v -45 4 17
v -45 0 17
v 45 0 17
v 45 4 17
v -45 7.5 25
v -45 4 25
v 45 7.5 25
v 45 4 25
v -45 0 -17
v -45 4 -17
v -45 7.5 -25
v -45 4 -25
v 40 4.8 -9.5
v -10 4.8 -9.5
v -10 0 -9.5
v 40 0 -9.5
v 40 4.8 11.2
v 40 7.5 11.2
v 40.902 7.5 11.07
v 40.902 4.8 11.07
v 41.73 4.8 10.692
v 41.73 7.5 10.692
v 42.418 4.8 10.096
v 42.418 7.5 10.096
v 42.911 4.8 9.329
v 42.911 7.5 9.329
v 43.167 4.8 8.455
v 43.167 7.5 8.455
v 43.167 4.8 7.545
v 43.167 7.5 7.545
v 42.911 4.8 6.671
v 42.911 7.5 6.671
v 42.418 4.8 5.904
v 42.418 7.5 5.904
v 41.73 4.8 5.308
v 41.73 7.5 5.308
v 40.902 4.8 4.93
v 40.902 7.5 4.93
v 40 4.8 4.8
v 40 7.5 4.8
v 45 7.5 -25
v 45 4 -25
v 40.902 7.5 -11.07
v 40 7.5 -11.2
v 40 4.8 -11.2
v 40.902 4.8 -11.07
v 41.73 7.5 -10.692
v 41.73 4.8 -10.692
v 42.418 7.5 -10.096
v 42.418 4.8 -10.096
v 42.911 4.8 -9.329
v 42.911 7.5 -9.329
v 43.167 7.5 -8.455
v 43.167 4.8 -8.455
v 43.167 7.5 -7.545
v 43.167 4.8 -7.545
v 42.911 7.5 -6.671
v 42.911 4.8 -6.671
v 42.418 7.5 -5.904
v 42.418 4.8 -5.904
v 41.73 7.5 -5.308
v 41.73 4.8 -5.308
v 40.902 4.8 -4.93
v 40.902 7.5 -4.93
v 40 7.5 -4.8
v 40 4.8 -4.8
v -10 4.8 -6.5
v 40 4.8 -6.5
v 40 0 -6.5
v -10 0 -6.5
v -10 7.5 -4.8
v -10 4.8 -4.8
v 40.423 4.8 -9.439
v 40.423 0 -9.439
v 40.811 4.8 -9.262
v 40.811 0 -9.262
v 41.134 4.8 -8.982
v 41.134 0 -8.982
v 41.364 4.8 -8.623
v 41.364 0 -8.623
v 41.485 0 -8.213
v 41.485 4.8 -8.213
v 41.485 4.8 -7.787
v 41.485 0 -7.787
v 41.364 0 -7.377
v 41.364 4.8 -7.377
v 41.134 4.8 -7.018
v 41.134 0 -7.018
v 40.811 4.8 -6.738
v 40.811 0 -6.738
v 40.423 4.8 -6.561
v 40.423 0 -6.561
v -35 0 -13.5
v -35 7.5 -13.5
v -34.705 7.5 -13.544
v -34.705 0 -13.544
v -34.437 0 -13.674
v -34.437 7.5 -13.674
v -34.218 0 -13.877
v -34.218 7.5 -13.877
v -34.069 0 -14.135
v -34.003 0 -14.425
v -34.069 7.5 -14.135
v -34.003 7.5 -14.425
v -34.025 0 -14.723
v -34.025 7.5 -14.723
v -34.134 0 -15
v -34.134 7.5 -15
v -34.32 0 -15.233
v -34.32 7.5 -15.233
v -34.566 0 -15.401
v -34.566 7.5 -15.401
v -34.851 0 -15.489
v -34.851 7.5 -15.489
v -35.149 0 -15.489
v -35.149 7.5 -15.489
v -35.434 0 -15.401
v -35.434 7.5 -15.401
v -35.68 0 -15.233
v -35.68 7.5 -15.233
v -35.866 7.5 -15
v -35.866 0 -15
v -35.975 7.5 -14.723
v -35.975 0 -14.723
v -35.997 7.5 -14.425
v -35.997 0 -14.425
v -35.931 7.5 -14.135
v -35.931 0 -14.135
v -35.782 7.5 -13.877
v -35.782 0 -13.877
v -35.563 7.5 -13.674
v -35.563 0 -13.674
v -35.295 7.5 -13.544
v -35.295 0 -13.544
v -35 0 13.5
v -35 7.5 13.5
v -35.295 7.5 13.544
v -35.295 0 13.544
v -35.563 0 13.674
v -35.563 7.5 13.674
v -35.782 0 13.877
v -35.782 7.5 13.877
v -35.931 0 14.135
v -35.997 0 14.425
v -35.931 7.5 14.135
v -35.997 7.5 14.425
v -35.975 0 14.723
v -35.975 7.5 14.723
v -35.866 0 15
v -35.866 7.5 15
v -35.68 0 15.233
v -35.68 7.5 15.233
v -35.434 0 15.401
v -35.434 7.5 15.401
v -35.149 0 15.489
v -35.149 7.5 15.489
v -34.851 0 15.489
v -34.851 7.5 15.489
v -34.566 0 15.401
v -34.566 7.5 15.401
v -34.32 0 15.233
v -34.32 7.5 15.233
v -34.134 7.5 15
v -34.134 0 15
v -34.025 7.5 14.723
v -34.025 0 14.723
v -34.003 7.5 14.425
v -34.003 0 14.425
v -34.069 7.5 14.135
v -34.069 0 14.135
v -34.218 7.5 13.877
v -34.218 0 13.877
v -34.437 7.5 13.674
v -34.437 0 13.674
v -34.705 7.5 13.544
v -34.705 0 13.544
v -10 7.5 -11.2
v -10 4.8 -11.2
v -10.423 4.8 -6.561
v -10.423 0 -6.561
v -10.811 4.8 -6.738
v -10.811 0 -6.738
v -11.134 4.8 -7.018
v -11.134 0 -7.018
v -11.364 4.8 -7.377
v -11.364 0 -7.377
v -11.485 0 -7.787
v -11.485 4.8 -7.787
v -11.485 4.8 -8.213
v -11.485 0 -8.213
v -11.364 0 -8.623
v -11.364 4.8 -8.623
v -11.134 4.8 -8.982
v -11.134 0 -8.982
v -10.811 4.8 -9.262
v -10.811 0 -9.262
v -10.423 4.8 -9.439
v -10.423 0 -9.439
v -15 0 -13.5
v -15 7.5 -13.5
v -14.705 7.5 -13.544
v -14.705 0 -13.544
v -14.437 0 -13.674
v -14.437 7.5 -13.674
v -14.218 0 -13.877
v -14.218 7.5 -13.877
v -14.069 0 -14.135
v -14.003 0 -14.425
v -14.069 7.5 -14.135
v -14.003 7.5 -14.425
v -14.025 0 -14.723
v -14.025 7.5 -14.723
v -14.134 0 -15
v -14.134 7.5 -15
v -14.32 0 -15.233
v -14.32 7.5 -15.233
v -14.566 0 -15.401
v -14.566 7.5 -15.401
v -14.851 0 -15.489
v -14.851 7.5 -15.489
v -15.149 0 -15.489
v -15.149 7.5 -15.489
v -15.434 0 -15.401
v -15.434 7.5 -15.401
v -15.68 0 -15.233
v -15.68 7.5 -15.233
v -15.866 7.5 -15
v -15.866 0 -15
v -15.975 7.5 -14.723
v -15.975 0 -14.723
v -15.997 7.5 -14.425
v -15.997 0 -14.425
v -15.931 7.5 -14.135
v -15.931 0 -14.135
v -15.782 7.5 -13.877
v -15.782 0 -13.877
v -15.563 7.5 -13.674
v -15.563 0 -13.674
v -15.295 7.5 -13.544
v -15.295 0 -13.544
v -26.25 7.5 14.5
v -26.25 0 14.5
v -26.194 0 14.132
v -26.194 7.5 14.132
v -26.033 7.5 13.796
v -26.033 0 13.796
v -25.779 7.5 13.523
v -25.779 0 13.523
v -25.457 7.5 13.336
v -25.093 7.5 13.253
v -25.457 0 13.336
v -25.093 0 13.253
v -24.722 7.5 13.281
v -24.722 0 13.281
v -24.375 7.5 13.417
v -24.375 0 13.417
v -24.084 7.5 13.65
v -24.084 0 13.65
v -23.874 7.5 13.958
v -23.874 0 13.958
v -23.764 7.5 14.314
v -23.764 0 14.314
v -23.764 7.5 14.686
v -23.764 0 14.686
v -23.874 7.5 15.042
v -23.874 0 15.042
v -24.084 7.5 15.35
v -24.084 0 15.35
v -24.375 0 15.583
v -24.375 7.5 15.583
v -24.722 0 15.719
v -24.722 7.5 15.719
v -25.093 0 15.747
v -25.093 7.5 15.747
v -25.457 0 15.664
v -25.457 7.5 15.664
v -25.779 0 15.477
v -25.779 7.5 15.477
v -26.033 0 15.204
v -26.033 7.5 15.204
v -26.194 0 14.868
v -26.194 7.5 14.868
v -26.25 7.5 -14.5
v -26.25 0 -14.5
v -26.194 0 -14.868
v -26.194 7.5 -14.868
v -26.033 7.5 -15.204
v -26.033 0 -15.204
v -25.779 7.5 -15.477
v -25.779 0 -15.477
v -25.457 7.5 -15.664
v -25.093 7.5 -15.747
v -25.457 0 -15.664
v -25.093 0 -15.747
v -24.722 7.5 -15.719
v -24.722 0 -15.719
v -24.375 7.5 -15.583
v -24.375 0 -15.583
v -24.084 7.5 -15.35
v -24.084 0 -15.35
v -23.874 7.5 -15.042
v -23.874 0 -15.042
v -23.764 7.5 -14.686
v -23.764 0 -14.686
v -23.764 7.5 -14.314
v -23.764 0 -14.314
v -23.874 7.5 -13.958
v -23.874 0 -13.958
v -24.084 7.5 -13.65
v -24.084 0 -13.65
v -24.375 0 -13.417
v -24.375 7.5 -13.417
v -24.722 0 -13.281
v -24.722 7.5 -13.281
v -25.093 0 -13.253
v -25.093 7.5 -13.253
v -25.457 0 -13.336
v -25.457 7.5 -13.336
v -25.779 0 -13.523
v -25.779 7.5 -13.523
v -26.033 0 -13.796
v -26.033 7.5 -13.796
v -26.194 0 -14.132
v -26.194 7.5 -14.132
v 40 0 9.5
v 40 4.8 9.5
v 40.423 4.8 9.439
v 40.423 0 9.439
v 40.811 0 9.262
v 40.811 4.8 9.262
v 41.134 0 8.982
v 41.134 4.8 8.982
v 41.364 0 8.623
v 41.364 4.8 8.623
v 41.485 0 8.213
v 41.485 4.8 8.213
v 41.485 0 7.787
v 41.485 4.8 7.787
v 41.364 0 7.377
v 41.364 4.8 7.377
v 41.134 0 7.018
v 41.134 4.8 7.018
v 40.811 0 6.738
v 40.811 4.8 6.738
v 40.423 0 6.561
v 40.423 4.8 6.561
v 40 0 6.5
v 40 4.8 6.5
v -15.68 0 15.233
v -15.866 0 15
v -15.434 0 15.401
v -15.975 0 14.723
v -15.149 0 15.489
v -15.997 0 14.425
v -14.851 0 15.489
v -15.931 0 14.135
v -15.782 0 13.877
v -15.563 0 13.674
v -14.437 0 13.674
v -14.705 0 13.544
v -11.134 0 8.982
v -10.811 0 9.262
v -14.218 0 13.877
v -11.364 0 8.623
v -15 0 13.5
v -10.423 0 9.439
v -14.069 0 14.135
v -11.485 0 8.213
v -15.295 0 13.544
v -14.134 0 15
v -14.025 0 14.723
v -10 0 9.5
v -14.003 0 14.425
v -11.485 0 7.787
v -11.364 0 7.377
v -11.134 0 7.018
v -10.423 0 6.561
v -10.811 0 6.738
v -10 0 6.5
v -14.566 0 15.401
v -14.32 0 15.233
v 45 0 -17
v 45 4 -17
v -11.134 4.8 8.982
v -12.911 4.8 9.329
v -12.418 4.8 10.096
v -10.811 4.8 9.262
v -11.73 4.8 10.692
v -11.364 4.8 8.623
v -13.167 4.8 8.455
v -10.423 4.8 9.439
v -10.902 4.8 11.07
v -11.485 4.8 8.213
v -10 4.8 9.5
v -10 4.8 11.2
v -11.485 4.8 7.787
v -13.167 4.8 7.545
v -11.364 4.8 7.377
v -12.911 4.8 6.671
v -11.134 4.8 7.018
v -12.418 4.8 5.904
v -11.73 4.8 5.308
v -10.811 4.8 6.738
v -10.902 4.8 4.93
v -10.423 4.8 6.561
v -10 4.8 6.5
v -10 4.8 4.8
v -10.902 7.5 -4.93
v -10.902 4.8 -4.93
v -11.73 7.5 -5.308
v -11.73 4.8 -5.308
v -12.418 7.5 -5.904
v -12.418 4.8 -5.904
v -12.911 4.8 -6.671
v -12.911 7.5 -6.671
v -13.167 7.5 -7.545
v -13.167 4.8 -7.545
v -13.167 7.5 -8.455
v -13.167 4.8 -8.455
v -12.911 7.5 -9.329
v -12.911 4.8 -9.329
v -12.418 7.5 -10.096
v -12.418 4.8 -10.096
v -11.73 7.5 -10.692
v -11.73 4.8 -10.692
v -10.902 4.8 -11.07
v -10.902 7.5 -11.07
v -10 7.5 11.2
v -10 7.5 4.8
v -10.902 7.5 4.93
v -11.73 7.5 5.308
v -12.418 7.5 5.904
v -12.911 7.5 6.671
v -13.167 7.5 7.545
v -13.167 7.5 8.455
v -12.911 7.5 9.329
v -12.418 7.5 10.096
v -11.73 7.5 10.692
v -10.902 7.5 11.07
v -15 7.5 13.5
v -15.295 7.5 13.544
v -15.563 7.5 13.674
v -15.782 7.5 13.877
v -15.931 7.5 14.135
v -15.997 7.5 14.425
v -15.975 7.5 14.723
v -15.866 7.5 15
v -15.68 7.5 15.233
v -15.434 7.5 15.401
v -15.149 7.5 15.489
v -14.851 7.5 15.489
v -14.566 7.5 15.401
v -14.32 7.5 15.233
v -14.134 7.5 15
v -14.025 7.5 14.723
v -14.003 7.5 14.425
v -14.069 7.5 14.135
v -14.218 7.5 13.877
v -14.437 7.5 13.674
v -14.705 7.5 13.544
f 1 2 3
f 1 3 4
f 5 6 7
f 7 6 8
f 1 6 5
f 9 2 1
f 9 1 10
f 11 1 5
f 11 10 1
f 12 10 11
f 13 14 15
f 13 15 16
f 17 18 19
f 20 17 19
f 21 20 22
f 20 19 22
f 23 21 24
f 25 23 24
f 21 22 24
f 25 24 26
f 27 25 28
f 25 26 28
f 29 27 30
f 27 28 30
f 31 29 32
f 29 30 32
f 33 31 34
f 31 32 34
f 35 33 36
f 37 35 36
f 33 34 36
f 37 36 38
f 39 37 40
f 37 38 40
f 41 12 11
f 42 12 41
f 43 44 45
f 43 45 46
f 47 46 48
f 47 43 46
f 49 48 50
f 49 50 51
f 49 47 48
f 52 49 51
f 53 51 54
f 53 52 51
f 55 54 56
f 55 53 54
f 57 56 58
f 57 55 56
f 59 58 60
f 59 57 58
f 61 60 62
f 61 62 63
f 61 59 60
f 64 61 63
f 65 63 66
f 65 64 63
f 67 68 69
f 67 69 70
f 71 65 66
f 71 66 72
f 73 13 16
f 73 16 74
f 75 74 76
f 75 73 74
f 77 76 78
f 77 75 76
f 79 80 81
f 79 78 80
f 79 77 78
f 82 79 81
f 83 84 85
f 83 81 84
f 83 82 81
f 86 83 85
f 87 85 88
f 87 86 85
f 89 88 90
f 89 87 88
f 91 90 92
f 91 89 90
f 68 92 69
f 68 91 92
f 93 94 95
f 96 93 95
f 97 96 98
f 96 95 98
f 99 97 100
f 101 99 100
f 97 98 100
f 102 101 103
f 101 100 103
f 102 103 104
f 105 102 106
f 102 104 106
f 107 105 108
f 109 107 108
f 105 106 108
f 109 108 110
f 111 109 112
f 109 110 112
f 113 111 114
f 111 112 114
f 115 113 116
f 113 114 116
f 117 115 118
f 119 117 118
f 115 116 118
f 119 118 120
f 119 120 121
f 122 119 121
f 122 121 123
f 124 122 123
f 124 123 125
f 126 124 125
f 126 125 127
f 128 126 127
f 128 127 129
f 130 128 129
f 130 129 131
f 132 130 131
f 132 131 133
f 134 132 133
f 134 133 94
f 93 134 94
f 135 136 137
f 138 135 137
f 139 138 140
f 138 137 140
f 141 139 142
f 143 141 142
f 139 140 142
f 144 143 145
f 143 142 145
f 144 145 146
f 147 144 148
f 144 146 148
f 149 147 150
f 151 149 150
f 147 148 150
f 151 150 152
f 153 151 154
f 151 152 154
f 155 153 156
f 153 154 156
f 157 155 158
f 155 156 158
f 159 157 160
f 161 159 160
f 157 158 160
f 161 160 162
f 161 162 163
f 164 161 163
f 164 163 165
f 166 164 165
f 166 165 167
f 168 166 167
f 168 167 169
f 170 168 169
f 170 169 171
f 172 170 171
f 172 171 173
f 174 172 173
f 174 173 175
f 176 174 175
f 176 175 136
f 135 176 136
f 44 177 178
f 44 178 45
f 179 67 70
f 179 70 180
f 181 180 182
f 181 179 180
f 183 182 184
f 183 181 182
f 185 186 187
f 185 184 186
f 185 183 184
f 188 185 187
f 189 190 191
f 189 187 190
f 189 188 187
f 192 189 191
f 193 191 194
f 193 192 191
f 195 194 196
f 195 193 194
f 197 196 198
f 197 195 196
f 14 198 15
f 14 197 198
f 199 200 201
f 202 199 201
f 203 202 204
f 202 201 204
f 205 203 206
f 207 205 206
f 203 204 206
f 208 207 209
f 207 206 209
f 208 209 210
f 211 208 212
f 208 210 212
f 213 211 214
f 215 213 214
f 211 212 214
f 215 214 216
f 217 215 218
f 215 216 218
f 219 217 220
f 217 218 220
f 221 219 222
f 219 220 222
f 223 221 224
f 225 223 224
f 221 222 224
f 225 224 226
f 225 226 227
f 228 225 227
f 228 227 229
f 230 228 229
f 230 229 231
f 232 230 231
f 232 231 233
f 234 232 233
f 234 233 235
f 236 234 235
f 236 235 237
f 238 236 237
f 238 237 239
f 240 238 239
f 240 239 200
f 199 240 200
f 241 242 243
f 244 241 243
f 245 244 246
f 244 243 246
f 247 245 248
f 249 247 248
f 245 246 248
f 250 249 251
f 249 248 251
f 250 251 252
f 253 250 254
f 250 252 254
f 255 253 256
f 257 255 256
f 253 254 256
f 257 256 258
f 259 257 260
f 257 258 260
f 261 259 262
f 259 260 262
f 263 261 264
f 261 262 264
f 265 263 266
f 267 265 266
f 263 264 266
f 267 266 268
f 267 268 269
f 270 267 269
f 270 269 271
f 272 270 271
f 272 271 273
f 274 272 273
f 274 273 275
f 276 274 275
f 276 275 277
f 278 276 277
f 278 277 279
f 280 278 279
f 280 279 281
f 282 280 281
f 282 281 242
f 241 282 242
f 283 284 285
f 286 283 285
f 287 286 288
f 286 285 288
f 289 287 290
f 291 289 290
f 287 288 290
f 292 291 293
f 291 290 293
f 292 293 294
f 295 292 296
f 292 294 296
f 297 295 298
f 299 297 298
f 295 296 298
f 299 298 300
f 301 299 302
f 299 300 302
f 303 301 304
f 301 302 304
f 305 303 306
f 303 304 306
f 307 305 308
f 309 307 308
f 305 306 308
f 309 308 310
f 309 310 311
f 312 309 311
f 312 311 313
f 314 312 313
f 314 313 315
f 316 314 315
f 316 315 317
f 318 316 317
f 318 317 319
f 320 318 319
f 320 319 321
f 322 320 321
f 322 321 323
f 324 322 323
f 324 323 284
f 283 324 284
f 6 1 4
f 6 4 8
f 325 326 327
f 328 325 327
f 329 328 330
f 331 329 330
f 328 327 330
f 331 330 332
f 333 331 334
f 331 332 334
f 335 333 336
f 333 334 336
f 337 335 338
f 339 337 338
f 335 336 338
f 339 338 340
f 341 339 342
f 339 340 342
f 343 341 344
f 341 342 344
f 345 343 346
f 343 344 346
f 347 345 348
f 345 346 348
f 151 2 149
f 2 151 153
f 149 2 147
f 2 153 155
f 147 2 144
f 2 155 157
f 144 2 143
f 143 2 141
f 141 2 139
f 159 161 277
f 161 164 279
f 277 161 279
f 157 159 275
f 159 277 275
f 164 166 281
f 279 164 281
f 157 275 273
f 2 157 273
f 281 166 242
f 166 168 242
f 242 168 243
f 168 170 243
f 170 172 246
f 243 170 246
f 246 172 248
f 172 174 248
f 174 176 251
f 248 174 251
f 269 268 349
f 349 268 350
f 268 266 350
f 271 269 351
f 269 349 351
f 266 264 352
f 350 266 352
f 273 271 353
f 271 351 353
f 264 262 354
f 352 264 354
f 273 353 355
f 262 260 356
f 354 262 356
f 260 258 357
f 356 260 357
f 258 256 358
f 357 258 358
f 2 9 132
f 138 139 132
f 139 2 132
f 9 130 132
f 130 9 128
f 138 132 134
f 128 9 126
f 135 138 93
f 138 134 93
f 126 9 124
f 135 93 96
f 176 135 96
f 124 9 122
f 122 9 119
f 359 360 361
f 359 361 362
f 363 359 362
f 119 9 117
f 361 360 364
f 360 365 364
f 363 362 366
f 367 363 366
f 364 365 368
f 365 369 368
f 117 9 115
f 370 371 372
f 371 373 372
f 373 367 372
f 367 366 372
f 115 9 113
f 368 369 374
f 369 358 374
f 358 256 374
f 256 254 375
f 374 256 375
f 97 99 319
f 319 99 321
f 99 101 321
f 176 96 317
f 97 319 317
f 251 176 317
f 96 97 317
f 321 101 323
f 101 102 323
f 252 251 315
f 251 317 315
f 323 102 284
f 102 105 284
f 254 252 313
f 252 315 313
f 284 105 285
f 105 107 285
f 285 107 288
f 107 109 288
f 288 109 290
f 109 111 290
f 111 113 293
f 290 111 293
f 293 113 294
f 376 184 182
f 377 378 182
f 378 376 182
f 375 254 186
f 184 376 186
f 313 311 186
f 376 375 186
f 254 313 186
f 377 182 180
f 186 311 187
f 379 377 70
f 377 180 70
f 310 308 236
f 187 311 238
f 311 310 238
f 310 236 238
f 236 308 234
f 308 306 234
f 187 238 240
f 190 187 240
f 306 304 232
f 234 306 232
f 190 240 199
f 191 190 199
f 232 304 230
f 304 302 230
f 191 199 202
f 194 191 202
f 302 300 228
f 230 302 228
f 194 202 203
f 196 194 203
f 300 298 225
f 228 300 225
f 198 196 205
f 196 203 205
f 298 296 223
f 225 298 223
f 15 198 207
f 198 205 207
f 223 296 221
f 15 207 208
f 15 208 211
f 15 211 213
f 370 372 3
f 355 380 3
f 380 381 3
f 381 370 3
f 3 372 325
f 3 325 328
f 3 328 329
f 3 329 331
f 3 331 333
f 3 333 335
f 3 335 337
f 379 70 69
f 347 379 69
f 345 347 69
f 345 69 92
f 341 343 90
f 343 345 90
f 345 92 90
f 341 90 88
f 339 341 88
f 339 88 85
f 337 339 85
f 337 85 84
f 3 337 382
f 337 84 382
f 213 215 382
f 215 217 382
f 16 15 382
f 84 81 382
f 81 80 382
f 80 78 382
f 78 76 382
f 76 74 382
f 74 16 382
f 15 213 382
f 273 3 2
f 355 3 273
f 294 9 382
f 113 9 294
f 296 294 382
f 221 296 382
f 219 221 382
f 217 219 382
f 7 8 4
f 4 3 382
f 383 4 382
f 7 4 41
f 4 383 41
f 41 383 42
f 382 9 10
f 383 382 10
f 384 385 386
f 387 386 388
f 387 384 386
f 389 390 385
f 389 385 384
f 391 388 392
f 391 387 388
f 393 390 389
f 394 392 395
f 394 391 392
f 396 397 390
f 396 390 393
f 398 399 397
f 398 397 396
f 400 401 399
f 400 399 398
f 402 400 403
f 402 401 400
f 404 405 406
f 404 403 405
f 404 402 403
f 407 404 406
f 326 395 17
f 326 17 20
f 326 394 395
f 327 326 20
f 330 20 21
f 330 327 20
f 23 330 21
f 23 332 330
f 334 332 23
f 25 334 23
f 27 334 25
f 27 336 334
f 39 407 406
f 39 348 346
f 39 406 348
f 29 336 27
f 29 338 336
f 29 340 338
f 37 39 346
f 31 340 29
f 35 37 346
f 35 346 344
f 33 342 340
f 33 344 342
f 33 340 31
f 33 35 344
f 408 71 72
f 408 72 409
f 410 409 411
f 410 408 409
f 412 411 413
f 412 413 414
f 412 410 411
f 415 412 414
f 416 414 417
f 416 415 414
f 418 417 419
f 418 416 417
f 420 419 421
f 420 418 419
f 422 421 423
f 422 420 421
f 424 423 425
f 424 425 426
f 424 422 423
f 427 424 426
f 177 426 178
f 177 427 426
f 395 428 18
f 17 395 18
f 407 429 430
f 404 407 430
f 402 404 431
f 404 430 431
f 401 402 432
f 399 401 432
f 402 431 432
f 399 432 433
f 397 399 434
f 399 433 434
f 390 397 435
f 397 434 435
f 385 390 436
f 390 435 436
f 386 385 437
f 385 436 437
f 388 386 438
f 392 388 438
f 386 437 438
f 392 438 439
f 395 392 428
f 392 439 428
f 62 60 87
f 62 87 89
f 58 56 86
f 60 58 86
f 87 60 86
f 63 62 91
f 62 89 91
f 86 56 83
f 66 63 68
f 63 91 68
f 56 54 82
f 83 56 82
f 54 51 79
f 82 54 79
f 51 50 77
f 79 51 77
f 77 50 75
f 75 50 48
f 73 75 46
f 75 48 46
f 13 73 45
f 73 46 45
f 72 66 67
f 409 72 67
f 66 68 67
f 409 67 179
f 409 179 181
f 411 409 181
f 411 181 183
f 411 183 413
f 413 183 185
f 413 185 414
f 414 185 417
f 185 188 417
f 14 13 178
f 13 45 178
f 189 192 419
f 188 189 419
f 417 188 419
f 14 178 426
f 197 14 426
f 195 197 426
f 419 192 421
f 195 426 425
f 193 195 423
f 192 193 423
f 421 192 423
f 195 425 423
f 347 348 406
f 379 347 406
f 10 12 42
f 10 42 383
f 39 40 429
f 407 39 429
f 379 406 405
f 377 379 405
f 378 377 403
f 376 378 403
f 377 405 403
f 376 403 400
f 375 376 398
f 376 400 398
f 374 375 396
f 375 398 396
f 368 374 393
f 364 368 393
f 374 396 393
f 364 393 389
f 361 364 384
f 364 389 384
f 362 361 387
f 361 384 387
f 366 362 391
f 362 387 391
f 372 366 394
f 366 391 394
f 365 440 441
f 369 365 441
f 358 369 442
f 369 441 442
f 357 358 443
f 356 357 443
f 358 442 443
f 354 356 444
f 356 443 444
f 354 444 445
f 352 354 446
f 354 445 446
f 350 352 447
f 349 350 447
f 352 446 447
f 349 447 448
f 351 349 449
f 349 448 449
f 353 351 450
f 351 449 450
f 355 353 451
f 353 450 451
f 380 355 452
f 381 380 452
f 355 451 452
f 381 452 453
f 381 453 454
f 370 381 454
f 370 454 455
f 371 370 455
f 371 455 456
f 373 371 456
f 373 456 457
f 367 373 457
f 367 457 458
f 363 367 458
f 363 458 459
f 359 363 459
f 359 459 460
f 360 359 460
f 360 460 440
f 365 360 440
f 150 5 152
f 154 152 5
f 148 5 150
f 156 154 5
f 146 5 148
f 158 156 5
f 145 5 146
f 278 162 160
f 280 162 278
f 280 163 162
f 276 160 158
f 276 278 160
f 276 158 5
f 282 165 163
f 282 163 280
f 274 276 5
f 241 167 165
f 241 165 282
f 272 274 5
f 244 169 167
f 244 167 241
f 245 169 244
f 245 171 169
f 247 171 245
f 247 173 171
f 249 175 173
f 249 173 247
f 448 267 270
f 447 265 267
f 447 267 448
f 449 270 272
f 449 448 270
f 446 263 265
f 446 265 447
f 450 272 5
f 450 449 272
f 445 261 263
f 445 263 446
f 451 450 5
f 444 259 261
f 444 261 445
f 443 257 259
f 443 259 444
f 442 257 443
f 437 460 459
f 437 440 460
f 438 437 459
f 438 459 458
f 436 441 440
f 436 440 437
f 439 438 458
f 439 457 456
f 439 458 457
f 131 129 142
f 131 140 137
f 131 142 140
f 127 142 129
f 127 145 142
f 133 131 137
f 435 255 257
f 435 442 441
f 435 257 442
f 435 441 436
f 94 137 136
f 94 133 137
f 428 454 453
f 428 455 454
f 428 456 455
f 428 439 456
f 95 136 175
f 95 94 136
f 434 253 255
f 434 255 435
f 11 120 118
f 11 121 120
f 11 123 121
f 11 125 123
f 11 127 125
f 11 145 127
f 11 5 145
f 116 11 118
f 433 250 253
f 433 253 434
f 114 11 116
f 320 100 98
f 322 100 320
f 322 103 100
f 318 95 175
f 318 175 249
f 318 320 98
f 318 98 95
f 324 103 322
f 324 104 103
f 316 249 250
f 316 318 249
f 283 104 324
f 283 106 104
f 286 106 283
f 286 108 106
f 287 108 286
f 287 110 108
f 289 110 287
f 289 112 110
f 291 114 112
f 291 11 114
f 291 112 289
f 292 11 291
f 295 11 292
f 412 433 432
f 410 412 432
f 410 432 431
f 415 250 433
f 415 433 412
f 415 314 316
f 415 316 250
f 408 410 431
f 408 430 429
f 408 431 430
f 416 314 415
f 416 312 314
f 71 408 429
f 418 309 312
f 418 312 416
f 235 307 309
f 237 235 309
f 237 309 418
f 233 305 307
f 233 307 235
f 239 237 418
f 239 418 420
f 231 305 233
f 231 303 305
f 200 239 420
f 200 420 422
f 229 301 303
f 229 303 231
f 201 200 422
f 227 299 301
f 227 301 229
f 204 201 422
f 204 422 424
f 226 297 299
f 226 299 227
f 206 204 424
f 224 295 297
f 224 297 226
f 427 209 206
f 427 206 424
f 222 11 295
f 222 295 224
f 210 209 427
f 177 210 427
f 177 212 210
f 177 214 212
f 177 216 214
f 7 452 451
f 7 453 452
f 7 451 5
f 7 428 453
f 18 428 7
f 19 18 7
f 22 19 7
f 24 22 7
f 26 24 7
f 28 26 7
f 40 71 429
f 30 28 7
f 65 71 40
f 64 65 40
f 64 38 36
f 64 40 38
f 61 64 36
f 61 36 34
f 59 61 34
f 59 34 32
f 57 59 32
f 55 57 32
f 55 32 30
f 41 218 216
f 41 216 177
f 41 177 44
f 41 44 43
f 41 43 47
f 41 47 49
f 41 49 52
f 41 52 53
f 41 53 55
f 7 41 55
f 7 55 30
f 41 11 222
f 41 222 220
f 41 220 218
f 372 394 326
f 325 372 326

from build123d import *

# Parameters (mm, degrees)
SKIZZE1_W                       = 90
SKIZZE1_H                       = 50
AUFSATZ_LINEAR_AUSTRAGEN1_DEPTH = 7.5
SKIZZE2_R                       = 1
SCHNITT_LINEAR_AUSTRAGEN1_DEPTH = 53.021630117
SCHNITT_LINEAR_AUSTRAGEN2_DEPTH = 2.7
SKIZZE6_W                       = 13
SKIZZE6_H                       = 4
SCHNITT_LINEAR_AUSTRAGEN5_DEPTH = 94.70832407
M3_GEWINDEBOHRUNG1_D            = 2.5


with BuildPart() as part:
    # Skizze1 → Aufsatz-Linear austragen1 (new body)
    with BuildSketch(Plane(origin=(0, 0, 0), x_dir=(1, 0, 0), z_dir=(0, 1, 0))):
        Rectangle(SKIZZE1_W, SKIZZE1_H)
    extrude(amount=AUFSATZ_LINEAR_AUSTRAGEN1_DEPTH)

    # Skizze2 → Schnitt-Linear austragen1 (cut, through all)
    with BuildSketch(Plane(origin=(0, 7.5, 0), x_dir=(1, 0, 0), z_dir=(0, 1, 0))):
        with Locations(Location((-35, 14.5, 0), (0, 0, 270))):
            Circle(SKIZZE2_R)
        with Locations(Location((-15, 14.5, 0), (0, 0, 270))):
            Circle(SKIZZE2_R)
        with Locations(Location((-35, -14.5, 0), (0, 0, 90))):
            Circle(SKIZZE2_R)
        with Locations(Location((-15, -14.5, 0), (0, 0, 90))):
            Circle(SKIZZE2_R)
        with BuildLine():
            Line((-10, 9.5), (40, 9.5))
            ThreePointArc((40, 9.5), (41.5, 8), (40, 6.5))
            Line((40, 6.5), (-10, 6.5))
            ThreePointArc((-10, 6.5), (-11.5, 8), (-10, 9.5))
        make_face()
        with BuildLine():
            Line((-10, -9.5), (40, -9.5))
            ThreePointArc((40, -9.5), (41.5, -8), (40, -6.5))
            Line((40, -6.5), (-10, -6.5))
            ThreePointArc((-10, -6.5), (-11.5, -8), (-10, -9.5))
        make_face()
    extrude(amount=-SCHNITT_LINEAR_AUSTRAGEN1_DEPTH, mode=Mode.SUBTRACT)

    # Skizze3 → Schnitt-Linear austragen2 (cut)
    with BuildSketch(Plane(origin=(0, 7.5, 0), x_dir=(1, 0, 0), z_dir=(0, 1, 0))):
        with BuildLine():
            Line((-10, 11.2), (40, 11.2))
            ThreePointArc((40, 11.2), (43.2, 8), (40, 4.8))
            Line((40, 4.8), (-10, 4.8))
            ThreePointArc((-10, 4.8), (-13.2, 8), (-10, 11.2))
        make_face()
        with BuildLine():
            Line((-10, -11.2), (40, -11.2))
            ThreePointArc((40, -11.2), (43.2, -8), (40, -4.8))
            Line((40, -4.8), (-10, -4.8))
            ThreePointArc((-10, -4.8), (-13.2, -8), (-10, -11.2))
        make_face()
    extrude(amount=-SCHNITT_LINEAR_AUSTRAGEN2_DEPTH, mode=Mode.SUBTRACT)

    # Skizze6 → Schnitt-Linear austragen5 (cut, through all)
    with BuildSketch(Plane.ZY.offset(45)):
        with Locations((-23.5, 2)):
            Rectangle(SKIZZE6_W, SKIZZE6_H)
        with Locations((23.5, 2)):
            Rectangle(SKIZZE6_W, SKIZZE6_H)
    extrude(amount=-SCHNITT_LINEAR_AUSTRAGEN5_DEPTH, mode=Mode.SUBTRACT)

    # M3 Gewindebohrung1 (through all)
    with Locations(Plane(origin=(0, 7.5, 0), x_dir=(1, 0, 0), z_dir=(0, 1, 0))):
        with Locations((-25, 14.5), (-25, -14.5)):
            Hole(M3_GEWINDEBOHRUNG1_D / 2)


solid = part.part
